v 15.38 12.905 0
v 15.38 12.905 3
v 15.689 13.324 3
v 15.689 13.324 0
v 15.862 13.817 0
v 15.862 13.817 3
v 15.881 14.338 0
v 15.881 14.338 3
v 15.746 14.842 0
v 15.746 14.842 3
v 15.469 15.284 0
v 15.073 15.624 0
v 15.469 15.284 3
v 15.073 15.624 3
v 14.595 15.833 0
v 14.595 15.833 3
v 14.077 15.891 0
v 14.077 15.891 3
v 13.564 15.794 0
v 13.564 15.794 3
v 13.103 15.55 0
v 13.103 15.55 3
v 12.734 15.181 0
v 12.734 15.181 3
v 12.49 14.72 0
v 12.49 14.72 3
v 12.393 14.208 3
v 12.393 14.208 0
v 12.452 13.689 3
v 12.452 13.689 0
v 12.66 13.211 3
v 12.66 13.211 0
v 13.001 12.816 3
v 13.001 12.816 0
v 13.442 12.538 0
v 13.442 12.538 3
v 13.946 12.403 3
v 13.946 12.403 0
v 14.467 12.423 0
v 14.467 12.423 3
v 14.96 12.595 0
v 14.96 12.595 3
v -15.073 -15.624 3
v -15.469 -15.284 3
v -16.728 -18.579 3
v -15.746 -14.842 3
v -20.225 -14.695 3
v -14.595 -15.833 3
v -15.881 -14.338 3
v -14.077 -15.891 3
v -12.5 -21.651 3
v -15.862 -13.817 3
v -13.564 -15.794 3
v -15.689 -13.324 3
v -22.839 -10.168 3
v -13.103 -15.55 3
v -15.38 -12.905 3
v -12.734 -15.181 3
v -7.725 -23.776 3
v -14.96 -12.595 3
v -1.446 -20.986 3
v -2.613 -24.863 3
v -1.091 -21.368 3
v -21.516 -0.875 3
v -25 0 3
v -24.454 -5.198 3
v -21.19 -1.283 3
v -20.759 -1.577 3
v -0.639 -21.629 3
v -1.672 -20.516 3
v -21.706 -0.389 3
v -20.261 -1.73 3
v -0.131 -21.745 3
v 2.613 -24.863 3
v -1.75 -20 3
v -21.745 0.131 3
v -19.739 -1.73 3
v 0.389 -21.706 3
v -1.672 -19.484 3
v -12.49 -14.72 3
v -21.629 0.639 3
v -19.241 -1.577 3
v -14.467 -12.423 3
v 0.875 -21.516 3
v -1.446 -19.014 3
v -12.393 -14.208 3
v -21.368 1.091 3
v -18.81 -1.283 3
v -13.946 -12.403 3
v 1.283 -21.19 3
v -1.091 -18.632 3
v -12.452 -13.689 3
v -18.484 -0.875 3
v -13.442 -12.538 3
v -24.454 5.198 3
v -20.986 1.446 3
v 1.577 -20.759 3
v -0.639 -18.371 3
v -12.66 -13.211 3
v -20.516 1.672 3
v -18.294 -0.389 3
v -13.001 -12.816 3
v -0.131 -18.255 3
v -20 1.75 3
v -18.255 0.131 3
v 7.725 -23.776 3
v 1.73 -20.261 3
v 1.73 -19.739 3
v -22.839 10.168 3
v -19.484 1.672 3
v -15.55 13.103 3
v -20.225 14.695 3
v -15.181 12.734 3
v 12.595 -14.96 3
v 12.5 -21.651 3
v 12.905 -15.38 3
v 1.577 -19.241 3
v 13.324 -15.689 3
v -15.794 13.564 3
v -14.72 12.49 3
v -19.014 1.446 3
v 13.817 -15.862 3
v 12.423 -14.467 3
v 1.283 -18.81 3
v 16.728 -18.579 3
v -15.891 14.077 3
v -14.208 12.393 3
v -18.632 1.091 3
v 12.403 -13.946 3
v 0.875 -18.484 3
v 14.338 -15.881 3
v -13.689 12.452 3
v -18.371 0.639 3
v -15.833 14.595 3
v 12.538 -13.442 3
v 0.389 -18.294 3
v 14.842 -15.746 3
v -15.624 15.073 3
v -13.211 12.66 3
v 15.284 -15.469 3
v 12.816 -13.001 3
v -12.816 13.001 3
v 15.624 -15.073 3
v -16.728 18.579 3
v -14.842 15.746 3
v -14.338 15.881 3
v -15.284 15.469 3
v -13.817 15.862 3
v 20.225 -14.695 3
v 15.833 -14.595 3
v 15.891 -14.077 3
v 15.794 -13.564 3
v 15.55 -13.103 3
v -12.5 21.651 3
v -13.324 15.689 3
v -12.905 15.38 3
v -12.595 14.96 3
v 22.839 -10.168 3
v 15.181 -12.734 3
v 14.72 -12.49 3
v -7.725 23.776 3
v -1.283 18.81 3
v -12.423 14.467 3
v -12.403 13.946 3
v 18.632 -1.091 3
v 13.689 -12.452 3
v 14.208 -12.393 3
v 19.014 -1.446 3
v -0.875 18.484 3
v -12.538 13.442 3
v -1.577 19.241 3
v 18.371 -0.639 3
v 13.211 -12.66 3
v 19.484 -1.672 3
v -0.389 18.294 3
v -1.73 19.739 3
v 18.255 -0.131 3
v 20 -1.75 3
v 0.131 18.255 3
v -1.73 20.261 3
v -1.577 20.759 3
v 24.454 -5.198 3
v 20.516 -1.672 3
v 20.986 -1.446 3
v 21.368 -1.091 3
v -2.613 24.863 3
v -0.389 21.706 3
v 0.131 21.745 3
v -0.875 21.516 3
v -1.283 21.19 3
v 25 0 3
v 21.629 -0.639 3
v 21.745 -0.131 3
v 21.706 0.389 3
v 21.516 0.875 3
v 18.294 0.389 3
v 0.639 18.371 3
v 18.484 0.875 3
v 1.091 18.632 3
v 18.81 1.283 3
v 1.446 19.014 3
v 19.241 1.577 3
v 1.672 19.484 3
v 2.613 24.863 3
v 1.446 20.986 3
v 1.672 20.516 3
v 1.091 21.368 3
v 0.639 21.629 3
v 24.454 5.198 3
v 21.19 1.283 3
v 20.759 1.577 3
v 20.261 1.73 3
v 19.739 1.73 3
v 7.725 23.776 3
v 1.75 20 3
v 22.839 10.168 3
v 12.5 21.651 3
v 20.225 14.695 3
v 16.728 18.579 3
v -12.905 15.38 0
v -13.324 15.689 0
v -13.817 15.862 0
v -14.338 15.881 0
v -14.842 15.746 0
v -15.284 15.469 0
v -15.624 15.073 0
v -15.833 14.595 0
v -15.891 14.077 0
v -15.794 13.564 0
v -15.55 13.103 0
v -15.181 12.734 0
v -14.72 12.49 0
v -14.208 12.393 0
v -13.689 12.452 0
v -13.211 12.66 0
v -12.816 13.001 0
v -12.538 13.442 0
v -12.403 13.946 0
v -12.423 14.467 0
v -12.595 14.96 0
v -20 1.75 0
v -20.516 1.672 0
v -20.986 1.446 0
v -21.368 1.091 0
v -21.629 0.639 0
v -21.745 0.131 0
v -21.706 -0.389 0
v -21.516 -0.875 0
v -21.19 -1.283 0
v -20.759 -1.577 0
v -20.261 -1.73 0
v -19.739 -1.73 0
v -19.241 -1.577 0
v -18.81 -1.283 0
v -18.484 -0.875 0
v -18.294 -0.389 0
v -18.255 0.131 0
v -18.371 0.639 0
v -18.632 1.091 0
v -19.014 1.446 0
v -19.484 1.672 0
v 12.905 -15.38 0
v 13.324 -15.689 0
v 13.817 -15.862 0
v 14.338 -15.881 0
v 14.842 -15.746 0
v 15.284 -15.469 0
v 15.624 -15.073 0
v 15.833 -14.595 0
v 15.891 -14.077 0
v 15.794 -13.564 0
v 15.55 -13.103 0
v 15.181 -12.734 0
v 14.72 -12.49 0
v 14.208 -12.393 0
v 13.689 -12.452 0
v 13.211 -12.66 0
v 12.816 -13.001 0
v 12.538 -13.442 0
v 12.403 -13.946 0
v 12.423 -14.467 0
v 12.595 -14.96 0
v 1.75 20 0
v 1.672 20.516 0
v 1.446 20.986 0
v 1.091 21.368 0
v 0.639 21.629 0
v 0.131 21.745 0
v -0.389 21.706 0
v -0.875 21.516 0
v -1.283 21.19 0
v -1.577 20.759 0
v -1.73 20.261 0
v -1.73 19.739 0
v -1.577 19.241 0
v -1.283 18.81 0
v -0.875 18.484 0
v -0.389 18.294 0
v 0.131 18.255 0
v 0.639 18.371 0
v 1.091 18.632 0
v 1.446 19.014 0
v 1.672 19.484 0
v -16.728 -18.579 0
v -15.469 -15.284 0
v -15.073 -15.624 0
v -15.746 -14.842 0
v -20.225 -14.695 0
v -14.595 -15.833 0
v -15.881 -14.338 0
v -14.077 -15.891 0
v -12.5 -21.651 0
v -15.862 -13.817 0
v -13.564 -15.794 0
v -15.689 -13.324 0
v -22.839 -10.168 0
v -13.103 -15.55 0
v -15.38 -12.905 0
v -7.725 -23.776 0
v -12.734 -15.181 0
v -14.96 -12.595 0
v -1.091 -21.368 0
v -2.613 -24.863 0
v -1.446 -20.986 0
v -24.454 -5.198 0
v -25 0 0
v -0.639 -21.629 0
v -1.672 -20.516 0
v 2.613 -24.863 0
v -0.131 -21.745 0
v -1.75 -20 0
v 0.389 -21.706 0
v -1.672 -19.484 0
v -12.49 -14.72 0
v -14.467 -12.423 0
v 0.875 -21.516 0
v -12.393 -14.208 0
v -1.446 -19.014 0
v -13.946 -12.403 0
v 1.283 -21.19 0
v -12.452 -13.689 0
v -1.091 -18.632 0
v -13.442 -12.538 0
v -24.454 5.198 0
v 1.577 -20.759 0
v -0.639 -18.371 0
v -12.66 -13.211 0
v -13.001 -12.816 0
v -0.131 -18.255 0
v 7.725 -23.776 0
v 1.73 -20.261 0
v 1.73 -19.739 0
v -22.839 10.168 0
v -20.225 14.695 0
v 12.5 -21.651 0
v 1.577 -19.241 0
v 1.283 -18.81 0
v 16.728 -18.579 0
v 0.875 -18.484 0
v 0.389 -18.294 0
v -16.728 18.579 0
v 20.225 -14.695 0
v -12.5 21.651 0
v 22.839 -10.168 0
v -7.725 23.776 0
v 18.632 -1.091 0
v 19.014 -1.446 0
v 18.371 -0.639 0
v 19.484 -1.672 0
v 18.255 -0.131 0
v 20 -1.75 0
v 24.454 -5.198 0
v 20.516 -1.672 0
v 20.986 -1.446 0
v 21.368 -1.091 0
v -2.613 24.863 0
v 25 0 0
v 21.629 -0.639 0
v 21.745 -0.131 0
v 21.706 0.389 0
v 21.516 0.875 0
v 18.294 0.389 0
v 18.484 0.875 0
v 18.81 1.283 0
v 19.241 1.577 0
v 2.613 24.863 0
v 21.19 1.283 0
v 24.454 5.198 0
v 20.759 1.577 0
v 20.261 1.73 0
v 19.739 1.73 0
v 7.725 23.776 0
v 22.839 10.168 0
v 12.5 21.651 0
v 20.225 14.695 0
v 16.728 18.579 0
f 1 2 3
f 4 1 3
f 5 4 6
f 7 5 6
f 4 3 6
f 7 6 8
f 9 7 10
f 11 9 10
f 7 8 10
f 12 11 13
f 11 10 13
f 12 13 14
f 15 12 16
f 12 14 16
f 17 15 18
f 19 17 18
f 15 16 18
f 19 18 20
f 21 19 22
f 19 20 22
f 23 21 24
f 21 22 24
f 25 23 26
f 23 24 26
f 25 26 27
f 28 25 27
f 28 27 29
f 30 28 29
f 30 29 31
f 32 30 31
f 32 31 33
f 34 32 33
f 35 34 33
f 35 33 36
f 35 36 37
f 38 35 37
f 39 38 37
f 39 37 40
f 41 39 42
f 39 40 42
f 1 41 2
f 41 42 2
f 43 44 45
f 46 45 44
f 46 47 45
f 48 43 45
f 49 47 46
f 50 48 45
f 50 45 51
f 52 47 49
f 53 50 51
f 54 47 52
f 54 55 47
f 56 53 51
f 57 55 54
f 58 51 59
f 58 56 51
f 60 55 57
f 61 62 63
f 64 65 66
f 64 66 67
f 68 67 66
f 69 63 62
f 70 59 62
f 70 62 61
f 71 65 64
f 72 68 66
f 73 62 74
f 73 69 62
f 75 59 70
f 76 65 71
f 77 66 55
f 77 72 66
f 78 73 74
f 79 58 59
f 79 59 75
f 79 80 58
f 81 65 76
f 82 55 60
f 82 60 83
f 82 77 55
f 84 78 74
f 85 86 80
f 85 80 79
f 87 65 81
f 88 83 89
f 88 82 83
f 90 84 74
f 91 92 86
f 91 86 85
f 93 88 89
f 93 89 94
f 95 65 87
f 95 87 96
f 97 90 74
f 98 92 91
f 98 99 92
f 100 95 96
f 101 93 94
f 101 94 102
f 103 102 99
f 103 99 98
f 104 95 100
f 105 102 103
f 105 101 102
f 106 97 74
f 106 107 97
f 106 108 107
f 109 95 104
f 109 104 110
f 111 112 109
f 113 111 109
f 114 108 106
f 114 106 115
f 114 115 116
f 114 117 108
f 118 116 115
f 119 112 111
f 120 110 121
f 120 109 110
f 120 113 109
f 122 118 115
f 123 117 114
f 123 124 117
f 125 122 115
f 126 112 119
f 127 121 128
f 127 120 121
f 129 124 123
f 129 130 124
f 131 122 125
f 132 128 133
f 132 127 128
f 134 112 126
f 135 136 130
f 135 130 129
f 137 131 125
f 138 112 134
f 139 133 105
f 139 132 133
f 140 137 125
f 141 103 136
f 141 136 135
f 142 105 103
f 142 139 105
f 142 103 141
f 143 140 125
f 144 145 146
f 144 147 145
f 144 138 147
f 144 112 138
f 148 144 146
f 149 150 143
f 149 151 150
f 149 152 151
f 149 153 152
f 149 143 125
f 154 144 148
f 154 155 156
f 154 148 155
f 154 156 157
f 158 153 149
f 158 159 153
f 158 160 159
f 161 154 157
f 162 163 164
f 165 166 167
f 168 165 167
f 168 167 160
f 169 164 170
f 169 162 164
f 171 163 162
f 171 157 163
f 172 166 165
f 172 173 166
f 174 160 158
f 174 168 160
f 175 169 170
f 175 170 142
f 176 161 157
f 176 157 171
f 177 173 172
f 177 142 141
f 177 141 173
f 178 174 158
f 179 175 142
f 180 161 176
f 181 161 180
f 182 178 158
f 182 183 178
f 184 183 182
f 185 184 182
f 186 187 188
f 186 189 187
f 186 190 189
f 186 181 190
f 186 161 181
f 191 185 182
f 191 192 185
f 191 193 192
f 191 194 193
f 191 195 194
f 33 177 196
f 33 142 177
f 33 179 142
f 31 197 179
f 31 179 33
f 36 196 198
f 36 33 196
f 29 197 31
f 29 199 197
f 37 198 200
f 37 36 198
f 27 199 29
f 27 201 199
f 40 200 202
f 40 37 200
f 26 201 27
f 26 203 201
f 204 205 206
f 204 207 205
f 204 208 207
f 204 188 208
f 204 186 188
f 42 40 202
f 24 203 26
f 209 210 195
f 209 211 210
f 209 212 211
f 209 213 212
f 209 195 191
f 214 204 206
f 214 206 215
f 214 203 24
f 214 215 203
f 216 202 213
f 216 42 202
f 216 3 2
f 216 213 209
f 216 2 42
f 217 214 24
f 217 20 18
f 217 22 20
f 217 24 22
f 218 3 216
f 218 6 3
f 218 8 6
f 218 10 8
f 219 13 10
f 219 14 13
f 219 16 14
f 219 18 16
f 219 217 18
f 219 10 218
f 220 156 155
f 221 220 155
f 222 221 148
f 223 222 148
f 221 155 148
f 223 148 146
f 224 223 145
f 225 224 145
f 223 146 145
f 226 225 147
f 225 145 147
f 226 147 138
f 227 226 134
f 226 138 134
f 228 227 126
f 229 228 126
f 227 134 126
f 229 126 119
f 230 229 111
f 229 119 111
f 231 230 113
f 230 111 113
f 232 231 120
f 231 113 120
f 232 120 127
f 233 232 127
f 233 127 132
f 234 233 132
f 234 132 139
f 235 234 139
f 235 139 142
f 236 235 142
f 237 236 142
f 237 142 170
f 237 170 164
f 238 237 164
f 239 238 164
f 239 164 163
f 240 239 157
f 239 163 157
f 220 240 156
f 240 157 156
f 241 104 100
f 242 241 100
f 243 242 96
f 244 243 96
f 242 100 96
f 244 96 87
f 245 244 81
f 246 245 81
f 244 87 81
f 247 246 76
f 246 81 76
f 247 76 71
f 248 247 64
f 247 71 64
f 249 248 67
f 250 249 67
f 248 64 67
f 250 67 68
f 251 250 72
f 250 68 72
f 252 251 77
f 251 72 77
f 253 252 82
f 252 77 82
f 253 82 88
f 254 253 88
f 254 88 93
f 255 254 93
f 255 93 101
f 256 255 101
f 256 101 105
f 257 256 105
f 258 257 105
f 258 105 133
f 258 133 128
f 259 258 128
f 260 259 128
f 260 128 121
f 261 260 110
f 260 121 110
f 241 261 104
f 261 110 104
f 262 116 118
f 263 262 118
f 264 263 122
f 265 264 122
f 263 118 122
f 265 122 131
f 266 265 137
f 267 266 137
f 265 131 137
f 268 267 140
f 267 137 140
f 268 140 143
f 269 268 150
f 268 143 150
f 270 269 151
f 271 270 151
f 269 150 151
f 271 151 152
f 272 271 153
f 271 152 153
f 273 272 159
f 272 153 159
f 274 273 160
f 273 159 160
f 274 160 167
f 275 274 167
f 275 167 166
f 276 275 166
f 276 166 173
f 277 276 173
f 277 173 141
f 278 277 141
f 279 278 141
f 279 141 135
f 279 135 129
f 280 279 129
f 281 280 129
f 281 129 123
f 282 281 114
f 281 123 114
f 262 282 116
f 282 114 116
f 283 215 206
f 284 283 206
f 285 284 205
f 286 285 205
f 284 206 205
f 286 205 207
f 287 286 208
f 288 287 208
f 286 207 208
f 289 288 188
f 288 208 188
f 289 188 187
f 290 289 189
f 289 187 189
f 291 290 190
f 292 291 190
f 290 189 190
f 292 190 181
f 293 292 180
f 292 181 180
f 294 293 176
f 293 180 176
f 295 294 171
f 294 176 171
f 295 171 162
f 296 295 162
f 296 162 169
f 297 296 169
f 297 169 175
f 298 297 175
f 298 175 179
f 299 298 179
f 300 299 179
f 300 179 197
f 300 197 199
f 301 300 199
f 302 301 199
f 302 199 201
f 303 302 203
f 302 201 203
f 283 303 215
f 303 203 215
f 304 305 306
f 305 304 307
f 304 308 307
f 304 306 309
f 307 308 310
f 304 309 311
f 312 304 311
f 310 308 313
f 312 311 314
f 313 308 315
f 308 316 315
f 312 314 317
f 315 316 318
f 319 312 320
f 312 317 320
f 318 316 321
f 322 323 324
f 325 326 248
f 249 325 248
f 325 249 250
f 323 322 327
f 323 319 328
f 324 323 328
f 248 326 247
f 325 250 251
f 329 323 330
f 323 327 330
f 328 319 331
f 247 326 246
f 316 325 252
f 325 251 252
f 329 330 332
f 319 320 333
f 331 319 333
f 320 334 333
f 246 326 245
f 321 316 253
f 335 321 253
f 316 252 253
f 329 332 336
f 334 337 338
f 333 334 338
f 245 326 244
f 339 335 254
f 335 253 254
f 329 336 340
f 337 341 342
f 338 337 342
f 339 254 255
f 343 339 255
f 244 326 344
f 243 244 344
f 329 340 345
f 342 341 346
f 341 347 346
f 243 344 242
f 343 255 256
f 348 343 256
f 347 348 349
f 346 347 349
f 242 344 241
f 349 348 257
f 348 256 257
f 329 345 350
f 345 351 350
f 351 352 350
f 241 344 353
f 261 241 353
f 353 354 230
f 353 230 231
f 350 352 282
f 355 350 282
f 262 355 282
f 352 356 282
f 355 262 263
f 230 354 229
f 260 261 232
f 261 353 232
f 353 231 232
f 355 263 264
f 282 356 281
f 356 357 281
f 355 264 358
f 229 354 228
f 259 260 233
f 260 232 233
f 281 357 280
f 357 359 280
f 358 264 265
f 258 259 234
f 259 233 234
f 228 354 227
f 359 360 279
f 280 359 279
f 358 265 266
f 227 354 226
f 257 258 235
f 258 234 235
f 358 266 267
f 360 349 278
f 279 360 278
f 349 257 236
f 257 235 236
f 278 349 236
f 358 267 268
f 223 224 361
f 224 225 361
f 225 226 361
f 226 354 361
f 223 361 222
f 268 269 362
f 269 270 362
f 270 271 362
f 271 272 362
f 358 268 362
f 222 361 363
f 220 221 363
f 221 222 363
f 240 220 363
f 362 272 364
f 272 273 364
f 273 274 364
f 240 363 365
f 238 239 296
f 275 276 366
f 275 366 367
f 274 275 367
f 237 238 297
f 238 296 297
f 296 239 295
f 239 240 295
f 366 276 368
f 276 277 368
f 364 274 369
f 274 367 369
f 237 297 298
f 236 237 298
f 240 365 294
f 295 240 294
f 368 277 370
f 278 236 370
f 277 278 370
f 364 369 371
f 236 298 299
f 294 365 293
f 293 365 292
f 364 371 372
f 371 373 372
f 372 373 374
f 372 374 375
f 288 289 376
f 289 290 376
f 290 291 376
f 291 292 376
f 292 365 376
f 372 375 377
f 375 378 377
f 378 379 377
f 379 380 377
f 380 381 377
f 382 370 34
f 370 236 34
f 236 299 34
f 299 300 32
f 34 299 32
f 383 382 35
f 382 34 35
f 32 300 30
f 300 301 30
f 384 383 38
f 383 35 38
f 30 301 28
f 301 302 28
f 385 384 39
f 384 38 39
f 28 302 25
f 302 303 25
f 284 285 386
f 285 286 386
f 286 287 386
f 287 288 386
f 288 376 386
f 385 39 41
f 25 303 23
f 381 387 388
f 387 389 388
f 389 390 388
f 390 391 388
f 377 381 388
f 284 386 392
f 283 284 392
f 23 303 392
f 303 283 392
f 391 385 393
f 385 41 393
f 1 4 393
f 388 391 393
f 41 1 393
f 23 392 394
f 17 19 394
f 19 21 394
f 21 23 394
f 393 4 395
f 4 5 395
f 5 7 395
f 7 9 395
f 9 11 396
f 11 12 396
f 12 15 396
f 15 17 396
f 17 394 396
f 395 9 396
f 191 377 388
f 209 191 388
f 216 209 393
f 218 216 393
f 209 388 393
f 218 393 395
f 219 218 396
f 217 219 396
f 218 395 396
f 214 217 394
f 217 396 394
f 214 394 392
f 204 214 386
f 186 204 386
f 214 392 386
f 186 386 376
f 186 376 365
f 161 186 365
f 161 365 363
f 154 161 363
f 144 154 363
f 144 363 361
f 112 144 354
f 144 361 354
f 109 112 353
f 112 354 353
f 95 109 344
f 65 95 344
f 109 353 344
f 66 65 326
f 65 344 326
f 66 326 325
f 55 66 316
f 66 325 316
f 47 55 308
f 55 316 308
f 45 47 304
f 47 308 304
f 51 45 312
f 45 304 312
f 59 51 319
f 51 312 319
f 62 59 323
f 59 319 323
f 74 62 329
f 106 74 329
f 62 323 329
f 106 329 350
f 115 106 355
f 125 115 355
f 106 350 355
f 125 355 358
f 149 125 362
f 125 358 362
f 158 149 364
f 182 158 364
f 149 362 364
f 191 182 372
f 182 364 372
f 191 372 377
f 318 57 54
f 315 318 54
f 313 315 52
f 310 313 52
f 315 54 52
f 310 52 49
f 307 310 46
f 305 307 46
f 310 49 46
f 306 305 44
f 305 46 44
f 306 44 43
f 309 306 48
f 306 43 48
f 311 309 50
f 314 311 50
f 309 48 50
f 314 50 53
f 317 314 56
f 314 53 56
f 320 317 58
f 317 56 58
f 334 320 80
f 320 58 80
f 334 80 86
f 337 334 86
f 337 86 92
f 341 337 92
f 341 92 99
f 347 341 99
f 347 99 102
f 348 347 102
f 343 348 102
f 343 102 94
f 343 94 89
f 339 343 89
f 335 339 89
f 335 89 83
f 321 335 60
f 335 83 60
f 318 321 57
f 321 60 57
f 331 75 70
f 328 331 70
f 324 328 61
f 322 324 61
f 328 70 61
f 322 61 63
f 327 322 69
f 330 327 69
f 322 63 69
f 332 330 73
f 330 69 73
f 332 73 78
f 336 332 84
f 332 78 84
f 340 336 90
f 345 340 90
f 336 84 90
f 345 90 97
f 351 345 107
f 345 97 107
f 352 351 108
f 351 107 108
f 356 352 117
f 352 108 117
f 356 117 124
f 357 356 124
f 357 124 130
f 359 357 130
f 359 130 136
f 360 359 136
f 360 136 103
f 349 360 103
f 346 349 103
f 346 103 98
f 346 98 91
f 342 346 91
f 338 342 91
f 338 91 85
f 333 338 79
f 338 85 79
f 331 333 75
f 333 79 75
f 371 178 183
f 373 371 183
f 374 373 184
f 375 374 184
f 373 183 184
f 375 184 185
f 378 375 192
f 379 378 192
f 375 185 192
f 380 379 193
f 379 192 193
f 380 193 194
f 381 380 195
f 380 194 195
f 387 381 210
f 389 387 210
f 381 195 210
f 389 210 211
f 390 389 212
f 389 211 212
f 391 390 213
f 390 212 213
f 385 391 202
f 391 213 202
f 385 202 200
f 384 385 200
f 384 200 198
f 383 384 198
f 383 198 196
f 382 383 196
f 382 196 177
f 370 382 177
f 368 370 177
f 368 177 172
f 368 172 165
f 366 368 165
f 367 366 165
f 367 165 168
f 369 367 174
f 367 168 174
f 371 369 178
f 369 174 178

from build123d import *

# Parameters (mm, degrees)
SKETCH1_R           = 25
BOSS_EXTRUDE1_DEPTH = 3
SKETCH2_R           = 1.75
CUT_EXTRUDE1_DEPTH  = 3
CIRPATTERN1_COUNT   = 8


with BuildPart() as part:
    # Sketch1 → Boss-Extrude1 (new body)
    with BuildSketch(Plane.XY):
        Circle(SKETCH1_R)
    extrude(amount=BOSS_EXTRUDE1_DEPTH)

    # Sketch2 → Cut-Extrude1 (cut)
    with BuildSketch(Plane.XY.offset(3)):
        with Locations((0, 20)):
            Circle(SKETCH2_R)
    cut_extrude1 = extrude(amount=-CUT_EXTRUDE1_DEPTH, mode=Mode.SUBTRACT)

    # CirPattern1: Cut-Extrude1 ×8 about axis
    cirpattern1_axis = Axis((0, 0, 0), (0, 0, 1))
    for i in range(1, CIRPATTERN1_COUNT):
        add(cut_extrude1.rotate(cirpattern1_axis, i * 360 / CIRPATTERN1_COUNT), mode=Mode.SUBTRACT)


solid = part.part
